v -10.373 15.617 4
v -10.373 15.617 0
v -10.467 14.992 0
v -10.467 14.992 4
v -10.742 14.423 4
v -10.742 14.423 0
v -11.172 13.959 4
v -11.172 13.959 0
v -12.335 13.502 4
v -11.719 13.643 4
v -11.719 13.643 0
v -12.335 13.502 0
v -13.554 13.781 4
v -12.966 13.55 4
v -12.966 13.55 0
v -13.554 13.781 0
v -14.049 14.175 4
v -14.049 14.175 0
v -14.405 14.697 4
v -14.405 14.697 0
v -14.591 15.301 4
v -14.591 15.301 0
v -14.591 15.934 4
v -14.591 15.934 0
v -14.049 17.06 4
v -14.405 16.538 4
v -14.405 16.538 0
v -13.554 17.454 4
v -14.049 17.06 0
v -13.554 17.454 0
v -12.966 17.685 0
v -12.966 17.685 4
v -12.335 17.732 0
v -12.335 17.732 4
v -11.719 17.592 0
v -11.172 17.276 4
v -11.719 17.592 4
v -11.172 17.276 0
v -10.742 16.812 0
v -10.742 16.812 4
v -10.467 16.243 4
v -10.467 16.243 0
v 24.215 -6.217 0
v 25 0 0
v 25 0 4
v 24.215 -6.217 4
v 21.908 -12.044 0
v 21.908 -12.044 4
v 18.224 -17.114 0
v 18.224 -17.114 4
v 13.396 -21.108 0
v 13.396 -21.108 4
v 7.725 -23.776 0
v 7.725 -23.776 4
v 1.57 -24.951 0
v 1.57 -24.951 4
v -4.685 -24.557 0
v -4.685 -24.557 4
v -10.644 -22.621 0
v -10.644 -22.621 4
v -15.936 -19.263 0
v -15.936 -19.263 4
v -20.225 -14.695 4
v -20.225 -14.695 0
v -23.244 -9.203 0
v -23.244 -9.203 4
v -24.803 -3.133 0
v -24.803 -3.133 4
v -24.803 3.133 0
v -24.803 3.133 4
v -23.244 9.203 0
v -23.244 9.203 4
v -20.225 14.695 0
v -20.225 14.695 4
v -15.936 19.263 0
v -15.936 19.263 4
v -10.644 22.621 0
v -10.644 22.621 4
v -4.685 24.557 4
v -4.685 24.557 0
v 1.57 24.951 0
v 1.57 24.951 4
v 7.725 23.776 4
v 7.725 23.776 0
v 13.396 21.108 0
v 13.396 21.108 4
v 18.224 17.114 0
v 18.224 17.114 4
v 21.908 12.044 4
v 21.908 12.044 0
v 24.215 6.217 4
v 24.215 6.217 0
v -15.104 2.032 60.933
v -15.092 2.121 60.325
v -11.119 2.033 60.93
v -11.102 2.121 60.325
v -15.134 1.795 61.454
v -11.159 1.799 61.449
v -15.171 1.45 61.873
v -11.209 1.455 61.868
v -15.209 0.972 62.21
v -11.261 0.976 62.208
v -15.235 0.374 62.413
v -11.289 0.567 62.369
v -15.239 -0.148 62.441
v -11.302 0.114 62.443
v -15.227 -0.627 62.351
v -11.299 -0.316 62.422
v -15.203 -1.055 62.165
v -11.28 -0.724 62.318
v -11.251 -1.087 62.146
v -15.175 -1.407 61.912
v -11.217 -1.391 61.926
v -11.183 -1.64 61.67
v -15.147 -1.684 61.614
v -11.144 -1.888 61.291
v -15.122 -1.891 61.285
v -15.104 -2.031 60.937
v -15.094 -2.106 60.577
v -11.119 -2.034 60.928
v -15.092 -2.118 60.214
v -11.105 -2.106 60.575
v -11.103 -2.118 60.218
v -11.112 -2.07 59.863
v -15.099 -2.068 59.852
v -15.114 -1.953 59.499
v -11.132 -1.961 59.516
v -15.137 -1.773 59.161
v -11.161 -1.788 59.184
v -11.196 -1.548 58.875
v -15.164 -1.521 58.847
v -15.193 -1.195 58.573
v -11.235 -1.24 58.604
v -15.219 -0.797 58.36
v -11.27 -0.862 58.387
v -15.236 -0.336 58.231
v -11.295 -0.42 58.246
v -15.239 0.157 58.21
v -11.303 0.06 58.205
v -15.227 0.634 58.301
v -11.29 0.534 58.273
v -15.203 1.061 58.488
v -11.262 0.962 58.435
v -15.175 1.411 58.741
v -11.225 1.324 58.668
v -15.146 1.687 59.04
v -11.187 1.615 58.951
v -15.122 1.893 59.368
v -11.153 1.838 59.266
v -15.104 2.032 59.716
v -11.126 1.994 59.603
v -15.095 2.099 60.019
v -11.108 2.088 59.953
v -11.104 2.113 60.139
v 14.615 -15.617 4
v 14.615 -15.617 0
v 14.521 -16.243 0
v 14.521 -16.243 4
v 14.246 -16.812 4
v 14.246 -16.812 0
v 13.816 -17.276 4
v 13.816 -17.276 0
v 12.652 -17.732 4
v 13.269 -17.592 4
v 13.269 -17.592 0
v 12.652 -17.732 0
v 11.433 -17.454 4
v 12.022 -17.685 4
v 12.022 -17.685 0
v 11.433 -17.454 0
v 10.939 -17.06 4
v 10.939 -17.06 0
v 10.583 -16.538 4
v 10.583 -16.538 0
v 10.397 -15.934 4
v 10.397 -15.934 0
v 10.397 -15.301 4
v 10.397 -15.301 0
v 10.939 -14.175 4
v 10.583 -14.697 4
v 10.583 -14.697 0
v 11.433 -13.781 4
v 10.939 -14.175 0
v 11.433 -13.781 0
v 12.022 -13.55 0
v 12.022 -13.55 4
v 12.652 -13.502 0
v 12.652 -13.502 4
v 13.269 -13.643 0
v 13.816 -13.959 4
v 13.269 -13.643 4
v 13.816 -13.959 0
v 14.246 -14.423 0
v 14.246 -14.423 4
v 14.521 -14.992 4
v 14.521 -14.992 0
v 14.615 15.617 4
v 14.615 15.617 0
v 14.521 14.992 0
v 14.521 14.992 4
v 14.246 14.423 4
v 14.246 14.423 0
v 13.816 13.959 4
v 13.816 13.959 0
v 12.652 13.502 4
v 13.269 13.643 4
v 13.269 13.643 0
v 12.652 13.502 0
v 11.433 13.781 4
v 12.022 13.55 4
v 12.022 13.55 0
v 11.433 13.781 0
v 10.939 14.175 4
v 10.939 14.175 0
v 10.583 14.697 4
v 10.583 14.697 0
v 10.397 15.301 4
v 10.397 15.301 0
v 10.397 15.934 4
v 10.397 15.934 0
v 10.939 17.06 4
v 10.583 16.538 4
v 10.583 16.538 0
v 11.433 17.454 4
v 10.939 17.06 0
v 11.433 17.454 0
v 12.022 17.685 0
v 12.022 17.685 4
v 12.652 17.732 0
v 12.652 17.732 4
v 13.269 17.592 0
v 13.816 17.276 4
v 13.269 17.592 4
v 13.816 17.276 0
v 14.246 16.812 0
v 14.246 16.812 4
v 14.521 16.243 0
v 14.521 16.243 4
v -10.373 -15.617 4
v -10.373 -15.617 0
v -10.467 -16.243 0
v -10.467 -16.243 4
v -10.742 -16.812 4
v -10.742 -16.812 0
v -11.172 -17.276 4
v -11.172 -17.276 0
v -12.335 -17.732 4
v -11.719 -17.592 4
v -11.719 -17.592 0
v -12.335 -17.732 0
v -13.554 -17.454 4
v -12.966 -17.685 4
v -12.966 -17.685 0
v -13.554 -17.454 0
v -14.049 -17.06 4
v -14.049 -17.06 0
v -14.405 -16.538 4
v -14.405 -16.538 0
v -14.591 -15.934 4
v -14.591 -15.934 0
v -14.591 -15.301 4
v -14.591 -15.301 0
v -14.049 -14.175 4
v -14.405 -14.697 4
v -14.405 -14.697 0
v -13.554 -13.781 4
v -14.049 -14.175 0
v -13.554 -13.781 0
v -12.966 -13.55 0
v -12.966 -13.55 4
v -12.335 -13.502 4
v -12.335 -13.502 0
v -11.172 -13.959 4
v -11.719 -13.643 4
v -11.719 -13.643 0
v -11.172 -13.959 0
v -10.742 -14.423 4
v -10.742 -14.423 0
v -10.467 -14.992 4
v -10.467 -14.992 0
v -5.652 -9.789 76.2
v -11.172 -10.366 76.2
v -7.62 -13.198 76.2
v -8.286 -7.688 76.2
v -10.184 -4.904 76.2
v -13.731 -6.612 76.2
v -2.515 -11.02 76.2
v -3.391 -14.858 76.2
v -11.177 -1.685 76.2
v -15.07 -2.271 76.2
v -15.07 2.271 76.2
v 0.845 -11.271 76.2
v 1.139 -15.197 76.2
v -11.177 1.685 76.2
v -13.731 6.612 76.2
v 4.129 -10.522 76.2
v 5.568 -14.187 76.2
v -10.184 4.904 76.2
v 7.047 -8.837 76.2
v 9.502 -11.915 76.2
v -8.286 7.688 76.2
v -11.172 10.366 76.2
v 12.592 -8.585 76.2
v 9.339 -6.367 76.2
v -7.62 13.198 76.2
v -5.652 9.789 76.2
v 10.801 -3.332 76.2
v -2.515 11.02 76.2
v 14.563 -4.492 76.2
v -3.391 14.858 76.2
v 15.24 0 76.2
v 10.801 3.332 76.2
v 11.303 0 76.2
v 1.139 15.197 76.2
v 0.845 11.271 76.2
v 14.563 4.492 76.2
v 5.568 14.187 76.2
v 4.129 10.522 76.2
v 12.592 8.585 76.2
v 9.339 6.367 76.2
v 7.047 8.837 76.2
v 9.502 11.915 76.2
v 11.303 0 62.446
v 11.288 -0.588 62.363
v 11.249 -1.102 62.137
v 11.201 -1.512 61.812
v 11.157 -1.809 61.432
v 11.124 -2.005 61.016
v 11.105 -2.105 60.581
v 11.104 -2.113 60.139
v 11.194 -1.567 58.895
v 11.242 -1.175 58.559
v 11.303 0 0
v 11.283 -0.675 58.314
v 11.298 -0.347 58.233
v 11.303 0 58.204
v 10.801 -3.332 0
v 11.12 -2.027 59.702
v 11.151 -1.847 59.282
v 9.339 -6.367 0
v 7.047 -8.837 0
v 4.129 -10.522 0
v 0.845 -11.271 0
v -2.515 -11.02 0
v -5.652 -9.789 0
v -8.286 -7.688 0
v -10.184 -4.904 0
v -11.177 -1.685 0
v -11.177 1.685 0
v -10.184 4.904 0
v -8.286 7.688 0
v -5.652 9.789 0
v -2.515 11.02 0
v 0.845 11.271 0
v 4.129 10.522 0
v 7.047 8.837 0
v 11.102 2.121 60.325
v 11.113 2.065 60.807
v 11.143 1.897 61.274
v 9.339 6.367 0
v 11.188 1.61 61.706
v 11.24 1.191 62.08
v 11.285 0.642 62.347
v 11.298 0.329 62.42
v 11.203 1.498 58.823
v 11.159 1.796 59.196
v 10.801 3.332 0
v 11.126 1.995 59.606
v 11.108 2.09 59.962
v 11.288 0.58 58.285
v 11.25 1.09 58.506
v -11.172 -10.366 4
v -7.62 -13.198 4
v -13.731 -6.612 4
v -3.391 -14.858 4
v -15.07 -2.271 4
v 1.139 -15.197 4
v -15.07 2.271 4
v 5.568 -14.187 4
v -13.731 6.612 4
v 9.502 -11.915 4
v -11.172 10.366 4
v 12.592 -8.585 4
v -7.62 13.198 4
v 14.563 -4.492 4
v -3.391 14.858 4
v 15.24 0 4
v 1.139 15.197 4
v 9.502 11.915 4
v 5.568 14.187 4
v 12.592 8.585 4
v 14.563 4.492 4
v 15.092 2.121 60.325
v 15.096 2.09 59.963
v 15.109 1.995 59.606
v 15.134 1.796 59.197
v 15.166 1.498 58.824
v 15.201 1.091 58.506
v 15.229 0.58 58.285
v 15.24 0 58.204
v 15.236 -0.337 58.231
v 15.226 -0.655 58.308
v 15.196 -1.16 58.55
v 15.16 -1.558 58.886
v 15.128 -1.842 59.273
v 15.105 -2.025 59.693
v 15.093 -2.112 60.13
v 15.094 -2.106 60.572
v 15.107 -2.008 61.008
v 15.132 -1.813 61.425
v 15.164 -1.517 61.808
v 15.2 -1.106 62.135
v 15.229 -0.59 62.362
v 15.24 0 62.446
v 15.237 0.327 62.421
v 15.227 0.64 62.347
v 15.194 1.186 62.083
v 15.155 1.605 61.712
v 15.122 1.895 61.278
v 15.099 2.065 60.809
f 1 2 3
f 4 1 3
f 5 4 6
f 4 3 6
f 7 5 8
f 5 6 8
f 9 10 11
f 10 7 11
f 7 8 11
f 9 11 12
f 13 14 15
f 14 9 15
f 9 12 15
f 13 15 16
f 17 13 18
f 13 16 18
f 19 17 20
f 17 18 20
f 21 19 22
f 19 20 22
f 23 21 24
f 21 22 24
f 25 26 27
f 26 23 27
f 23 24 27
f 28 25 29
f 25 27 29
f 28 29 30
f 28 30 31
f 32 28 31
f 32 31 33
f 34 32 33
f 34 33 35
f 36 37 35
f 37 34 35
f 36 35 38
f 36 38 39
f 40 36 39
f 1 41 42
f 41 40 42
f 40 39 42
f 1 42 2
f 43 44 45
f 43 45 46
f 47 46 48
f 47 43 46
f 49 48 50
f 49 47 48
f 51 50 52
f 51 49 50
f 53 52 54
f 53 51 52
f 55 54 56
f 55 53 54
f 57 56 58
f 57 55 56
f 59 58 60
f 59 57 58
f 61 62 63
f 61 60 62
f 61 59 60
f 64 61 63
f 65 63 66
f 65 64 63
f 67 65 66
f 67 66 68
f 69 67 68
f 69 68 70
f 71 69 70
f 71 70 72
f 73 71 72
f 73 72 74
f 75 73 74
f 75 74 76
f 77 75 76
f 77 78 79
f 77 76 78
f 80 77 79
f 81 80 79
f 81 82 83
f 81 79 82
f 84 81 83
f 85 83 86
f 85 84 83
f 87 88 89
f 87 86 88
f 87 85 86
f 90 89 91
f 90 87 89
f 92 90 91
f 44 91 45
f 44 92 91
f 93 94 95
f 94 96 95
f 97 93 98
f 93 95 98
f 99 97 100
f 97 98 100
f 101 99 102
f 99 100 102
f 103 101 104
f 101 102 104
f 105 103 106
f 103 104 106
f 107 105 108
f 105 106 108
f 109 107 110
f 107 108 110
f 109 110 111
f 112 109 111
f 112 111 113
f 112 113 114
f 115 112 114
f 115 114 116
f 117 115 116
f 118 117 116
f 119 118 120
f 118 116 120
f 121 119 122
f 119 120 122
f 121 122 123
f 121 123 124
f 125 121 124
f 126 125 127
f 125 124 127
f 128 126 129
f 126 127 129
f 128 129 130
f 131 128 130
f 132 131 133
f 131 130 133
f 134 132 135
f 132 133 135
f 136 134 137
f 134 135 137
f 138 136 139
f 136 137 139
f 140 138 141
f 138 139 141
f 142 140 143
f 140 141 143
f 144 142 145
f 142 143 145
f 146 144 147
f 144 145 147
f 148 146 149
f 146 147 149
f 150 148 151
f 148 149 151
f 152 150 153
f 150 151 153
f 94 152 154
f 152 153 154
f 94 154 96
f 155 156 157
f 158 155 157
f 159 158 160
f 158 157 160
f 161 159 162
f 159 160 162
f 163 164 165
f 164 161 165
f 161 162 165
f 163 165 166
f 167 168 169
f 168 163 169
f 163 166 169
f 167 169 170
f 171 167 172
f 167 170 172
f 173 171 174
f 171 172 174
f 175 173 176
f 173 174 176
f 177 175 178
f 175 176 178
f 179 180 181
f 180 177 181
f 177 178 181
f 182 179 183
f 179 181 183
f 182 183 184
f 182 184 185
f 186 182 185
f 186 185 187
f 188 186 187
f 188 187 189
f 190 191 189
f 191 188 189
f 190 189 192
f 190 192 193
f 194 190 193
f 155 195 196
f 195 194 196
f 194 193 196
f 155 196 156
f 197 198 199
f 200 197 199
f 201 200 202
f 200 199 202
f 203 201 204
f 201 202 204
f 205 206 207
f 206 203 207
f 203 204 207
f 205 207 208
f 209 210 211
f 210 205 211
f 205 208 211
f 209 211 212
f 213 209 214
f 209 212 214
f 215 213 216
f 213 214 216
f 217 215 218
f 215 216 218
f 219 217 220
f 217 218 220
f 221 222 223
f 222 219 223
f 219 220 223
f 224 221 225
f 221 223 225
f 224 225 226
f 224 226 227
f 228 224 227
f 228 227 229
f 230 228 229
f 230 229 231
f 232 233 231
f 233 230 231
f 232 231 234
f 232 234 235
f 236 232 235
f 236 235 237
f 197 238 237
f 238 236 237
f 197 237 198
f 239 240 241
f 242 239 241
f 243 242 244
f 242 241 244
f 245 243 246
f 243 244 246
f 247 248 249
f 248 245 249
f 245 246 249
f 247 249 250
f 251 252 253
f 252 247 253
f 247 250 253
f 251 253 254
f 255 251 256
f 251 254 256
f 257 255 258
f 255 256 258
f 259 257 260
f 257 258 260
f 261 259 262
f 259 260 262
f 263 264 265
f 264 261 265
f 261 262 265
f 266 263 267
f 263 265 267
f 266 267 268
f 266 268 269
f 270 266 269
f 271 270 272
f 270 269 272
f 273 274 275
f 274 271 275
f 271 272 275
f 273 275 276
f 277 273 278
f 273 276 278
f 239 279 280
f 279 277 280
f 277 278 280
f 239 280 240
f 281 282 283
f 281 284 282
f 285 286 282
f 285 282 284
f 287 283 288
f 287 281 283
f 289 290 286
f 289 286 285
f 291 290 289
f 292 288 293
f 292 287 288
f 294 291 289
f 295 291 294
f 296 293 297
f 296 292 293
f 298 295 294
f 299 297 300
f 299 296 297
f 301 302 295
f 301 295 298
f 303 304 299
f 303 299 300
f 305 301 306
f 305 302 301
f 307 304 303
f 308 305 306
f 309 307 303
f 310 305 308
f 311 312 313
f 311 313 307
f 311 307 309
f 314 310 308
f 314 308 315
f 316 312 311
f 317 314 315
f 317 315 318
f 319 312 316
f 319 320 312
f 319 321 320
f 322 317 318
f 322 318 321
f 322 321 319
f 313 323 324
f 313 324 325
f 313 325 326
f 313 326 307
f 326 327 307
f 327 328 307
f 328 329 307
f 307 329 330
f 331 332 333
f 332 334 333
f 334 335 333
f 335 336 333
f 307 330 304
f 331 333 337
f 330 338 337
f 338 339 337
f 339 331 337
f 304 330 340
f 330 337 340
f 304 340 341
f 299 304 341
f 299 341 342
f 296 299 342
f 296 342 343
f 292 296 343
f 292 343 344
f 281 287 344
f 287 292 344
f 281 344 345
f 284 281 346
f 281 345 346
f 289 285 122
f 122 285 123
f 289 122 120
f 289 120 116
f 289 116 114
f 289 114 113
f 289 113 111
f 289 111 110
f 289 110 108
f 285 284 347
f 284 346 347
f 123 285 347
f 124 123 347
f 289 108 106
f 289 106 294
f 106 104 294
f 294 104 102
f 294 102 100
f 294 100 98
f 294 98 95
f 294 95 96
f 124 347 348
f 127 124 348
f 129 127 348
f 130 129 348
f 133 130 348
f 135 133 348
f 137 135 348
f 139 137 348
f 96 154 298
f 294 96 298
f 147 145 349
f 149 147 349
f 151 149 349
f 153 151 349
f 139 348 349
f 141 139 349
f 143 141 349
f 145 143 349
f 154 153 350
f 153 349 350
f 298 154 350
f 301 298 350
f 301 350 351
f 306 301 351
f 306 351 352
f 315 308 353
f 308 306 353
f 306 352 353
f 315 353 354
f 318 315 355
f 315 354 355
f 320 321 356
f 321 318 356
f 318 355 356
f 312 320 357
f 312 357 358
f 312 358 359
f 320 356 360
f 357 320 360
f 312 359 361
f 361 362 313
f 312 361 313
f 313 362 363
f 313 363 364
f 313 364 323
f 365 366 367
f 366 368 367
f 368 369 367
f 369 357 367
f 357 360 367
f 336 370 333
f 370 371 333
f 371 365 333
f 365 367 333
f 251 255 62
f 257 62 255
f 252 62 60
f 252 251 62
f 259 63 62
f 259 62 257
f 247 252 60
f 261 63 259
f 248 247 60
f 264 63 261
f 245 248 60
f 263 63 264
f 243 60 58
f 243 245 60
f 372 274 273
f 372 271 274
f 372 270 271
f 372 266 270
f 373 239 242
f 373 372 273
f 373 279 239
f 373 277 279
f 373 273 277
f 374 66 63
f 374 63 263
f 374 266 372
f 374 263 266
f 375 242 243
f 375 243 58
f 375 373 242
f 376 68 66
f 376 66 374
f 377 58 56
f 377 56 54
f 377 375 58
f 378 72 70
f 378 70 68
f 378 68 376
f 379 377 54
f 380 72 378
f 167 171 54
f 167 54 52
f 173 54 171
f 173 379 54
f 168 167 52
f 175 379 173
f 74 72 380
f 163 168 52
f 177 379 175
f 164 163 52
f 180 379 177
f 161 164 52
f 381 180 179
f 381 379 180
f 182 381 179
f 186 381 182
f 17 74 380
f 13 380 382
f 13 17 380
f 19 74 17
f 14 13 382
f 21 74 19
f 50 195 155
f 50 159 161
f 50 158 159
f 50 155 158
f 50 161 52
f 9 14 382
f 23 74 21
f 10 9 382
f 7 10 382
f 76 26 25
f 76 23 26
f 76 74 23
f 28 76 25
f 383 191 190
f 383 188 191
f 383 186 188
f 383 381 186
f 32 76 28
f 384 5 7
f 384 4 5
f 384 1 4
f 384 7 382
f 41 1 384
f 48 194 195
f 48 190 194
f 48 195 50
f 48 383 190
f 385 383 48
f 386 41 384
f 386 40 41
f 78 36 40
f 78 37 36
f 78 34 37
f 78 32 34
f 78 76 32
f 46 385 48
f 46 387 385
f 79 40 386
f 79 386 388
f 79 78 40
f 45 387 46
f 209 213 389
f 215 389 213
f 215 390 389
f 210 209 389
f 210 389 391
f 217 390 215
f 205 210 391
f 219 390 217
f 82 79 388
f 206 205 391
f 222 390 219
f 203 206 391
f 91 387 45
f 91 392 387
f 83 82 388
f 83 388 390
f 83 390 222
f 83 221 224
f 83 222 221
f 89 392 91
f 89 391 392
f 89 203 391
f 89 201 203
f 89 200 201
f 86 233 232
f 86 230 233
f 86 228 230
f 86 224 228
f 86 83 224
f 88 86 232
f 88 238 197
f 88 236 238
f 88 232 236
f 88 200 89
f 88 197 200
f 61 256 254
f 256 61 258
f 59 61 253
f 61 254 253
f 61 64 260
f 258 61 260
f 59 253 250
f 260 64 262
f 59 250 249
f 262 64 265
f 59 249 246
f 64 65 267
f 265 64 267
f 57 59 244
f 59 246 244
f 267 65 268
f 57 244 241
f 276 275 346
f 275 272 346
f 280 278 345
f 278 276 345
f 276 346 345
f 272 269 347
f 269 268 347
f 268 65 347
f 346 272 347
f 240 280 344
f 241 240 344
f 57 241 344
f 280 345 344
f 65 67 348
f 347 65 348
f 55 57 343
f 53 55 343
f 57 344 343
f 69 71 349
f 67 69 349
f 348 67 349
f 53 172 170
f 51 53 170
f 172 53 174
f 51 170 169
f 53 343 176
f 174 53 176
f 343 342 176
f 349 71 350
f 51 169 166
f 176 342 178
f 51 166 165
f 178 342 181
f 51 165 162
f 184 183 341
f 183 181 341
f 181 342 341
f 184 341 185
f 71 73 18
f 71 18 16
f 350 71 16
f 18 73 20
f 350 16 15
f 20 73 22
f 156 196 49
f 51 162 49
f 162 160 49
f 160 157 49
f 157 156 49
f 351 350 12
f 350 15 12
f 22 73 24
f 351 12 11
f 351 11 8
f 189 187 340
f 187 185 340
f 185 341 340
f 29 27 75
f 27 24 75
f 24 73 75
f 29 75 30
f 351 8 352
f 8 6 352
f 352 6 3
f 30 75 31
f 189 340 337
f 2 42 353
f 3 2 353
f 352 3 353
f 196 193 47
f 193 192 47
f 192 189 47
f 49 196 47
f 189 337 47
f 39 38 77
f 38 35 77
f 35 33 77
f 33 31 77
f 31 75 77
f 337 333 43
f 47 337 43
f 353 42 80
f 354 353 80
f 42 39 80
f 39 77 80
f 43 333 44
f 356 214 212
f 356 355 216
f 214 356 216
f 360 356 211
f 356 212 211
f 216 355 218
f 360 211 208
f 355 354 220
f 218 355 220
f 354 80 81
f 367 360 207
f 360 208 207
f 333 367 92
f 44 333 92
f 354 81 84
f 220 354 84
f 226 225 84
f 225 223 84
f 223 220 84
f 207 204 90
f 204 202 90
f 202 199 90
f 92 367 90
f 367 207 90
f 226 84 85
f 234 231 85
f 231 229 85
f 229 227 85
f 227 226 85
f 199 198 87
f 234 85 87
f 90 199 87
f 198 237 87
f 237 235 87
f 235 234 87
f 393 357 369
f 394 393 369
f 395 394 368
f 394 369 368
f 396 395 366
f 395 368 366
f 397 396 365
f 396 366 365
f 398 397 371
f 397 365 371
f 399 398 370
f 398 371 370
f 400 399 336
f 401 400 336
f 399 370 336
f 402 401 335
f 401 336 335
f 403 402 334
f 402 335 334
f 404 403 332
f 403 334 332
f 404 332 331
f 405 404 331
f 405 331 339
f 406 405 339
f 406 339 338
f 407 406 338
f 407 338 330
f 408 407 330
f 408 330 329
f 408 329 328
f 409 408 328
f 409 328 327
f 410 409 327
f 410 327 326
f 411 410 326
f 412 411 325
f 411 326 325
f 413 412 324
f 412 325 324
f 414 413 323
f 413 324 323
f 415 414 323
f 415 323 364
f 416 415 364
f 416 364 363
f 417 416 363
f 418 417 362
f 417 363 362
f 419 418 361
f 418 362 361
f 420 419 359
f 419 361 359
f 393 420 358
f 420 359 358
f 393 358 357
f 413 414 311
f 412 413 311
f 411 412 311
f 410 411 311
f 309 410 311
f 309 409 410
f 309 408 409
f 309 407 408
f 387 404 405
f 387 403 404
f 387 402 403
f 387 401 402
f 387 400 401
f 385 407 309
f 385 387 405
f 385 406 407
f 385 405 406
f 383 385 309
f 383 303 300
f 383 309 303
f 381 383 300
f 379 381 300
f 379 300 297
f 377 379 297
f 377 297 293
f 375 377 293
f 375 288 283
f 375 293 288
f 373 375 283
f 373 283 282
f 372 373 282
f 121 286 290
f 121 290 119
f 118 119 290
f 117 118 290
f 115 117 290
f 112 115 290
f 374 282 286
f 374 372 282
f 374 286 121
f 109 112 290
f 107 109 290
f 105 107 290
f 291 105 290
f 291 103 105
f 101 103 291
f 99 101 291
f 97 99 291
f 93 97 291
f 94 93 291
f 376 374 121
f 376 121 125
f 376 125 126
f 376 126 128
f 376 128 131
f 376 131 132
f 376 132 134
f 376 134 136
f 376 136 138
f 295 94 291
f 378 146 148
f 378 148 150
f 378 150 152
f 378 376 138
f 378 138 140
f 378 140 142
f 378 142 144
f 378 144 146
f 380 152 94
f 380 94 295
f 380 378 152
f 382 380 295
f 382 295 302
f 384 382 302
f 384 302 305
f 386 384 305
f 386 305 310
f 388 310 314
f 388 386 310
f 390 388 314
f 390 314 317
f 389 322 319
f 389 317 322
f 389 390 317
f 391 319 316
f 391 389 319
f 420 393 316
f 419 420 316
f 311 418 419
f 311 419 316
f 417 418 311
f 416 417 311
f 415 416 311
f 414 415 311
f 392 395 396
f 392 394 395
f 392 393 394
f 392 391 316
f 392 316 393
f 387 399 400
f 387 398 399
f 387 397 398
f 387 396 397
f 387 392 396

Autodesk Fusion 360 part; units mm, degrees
sketch "Sketch1" plane through (0, 0, 0) normal (0, 0, 1) x (1, 0, 0)
  circle A0 centre (0, 0) radius 11.303
  circle A1 centre (0, 0) radius 25
  circle A2 centre (0, 0) radius 15.24
  circle A3 centre (-12.4939, 15.6174) radius 2.1209
  line L0 (0, 25) -> (0, -25) construction
  line L1 (-25, 0) -> (25, 0) construction
  line L2 (-25, 0) -> (25, 0) construction
  circle A4 centre (12.4939, 15.6174) radius 2.1209
  circle A5 centre (-12.4939, -15.6174) radius 2.1209
  circle A6 centre (12.4939, -15.6174) radius 2.1209
  dimension "d1" = 22.606
  dimension "d2" = 30.48
  dimension "d3" = 50
  dimension "d4" = 20
  dimension "d5" = 4.2418
extrude "Extrude1" add sketch "Sketch1" along normal blind 4 contours A1
extrude "Extrude2" add sketch "Sketch1" along normal blind 76.2 contours A2
sketch "Sketch2" plane through (0, 0, 0) normal (1, 0, 0) x (0, 1, 0)
  circle A0 centre (0, 60.325) radius 2.1209
  dimension "d10" = 4.2418
  dimension "d11" = 60.325
extrude "Extrude3" cut sketch "Sketch2" along normal through all and the other way through all
